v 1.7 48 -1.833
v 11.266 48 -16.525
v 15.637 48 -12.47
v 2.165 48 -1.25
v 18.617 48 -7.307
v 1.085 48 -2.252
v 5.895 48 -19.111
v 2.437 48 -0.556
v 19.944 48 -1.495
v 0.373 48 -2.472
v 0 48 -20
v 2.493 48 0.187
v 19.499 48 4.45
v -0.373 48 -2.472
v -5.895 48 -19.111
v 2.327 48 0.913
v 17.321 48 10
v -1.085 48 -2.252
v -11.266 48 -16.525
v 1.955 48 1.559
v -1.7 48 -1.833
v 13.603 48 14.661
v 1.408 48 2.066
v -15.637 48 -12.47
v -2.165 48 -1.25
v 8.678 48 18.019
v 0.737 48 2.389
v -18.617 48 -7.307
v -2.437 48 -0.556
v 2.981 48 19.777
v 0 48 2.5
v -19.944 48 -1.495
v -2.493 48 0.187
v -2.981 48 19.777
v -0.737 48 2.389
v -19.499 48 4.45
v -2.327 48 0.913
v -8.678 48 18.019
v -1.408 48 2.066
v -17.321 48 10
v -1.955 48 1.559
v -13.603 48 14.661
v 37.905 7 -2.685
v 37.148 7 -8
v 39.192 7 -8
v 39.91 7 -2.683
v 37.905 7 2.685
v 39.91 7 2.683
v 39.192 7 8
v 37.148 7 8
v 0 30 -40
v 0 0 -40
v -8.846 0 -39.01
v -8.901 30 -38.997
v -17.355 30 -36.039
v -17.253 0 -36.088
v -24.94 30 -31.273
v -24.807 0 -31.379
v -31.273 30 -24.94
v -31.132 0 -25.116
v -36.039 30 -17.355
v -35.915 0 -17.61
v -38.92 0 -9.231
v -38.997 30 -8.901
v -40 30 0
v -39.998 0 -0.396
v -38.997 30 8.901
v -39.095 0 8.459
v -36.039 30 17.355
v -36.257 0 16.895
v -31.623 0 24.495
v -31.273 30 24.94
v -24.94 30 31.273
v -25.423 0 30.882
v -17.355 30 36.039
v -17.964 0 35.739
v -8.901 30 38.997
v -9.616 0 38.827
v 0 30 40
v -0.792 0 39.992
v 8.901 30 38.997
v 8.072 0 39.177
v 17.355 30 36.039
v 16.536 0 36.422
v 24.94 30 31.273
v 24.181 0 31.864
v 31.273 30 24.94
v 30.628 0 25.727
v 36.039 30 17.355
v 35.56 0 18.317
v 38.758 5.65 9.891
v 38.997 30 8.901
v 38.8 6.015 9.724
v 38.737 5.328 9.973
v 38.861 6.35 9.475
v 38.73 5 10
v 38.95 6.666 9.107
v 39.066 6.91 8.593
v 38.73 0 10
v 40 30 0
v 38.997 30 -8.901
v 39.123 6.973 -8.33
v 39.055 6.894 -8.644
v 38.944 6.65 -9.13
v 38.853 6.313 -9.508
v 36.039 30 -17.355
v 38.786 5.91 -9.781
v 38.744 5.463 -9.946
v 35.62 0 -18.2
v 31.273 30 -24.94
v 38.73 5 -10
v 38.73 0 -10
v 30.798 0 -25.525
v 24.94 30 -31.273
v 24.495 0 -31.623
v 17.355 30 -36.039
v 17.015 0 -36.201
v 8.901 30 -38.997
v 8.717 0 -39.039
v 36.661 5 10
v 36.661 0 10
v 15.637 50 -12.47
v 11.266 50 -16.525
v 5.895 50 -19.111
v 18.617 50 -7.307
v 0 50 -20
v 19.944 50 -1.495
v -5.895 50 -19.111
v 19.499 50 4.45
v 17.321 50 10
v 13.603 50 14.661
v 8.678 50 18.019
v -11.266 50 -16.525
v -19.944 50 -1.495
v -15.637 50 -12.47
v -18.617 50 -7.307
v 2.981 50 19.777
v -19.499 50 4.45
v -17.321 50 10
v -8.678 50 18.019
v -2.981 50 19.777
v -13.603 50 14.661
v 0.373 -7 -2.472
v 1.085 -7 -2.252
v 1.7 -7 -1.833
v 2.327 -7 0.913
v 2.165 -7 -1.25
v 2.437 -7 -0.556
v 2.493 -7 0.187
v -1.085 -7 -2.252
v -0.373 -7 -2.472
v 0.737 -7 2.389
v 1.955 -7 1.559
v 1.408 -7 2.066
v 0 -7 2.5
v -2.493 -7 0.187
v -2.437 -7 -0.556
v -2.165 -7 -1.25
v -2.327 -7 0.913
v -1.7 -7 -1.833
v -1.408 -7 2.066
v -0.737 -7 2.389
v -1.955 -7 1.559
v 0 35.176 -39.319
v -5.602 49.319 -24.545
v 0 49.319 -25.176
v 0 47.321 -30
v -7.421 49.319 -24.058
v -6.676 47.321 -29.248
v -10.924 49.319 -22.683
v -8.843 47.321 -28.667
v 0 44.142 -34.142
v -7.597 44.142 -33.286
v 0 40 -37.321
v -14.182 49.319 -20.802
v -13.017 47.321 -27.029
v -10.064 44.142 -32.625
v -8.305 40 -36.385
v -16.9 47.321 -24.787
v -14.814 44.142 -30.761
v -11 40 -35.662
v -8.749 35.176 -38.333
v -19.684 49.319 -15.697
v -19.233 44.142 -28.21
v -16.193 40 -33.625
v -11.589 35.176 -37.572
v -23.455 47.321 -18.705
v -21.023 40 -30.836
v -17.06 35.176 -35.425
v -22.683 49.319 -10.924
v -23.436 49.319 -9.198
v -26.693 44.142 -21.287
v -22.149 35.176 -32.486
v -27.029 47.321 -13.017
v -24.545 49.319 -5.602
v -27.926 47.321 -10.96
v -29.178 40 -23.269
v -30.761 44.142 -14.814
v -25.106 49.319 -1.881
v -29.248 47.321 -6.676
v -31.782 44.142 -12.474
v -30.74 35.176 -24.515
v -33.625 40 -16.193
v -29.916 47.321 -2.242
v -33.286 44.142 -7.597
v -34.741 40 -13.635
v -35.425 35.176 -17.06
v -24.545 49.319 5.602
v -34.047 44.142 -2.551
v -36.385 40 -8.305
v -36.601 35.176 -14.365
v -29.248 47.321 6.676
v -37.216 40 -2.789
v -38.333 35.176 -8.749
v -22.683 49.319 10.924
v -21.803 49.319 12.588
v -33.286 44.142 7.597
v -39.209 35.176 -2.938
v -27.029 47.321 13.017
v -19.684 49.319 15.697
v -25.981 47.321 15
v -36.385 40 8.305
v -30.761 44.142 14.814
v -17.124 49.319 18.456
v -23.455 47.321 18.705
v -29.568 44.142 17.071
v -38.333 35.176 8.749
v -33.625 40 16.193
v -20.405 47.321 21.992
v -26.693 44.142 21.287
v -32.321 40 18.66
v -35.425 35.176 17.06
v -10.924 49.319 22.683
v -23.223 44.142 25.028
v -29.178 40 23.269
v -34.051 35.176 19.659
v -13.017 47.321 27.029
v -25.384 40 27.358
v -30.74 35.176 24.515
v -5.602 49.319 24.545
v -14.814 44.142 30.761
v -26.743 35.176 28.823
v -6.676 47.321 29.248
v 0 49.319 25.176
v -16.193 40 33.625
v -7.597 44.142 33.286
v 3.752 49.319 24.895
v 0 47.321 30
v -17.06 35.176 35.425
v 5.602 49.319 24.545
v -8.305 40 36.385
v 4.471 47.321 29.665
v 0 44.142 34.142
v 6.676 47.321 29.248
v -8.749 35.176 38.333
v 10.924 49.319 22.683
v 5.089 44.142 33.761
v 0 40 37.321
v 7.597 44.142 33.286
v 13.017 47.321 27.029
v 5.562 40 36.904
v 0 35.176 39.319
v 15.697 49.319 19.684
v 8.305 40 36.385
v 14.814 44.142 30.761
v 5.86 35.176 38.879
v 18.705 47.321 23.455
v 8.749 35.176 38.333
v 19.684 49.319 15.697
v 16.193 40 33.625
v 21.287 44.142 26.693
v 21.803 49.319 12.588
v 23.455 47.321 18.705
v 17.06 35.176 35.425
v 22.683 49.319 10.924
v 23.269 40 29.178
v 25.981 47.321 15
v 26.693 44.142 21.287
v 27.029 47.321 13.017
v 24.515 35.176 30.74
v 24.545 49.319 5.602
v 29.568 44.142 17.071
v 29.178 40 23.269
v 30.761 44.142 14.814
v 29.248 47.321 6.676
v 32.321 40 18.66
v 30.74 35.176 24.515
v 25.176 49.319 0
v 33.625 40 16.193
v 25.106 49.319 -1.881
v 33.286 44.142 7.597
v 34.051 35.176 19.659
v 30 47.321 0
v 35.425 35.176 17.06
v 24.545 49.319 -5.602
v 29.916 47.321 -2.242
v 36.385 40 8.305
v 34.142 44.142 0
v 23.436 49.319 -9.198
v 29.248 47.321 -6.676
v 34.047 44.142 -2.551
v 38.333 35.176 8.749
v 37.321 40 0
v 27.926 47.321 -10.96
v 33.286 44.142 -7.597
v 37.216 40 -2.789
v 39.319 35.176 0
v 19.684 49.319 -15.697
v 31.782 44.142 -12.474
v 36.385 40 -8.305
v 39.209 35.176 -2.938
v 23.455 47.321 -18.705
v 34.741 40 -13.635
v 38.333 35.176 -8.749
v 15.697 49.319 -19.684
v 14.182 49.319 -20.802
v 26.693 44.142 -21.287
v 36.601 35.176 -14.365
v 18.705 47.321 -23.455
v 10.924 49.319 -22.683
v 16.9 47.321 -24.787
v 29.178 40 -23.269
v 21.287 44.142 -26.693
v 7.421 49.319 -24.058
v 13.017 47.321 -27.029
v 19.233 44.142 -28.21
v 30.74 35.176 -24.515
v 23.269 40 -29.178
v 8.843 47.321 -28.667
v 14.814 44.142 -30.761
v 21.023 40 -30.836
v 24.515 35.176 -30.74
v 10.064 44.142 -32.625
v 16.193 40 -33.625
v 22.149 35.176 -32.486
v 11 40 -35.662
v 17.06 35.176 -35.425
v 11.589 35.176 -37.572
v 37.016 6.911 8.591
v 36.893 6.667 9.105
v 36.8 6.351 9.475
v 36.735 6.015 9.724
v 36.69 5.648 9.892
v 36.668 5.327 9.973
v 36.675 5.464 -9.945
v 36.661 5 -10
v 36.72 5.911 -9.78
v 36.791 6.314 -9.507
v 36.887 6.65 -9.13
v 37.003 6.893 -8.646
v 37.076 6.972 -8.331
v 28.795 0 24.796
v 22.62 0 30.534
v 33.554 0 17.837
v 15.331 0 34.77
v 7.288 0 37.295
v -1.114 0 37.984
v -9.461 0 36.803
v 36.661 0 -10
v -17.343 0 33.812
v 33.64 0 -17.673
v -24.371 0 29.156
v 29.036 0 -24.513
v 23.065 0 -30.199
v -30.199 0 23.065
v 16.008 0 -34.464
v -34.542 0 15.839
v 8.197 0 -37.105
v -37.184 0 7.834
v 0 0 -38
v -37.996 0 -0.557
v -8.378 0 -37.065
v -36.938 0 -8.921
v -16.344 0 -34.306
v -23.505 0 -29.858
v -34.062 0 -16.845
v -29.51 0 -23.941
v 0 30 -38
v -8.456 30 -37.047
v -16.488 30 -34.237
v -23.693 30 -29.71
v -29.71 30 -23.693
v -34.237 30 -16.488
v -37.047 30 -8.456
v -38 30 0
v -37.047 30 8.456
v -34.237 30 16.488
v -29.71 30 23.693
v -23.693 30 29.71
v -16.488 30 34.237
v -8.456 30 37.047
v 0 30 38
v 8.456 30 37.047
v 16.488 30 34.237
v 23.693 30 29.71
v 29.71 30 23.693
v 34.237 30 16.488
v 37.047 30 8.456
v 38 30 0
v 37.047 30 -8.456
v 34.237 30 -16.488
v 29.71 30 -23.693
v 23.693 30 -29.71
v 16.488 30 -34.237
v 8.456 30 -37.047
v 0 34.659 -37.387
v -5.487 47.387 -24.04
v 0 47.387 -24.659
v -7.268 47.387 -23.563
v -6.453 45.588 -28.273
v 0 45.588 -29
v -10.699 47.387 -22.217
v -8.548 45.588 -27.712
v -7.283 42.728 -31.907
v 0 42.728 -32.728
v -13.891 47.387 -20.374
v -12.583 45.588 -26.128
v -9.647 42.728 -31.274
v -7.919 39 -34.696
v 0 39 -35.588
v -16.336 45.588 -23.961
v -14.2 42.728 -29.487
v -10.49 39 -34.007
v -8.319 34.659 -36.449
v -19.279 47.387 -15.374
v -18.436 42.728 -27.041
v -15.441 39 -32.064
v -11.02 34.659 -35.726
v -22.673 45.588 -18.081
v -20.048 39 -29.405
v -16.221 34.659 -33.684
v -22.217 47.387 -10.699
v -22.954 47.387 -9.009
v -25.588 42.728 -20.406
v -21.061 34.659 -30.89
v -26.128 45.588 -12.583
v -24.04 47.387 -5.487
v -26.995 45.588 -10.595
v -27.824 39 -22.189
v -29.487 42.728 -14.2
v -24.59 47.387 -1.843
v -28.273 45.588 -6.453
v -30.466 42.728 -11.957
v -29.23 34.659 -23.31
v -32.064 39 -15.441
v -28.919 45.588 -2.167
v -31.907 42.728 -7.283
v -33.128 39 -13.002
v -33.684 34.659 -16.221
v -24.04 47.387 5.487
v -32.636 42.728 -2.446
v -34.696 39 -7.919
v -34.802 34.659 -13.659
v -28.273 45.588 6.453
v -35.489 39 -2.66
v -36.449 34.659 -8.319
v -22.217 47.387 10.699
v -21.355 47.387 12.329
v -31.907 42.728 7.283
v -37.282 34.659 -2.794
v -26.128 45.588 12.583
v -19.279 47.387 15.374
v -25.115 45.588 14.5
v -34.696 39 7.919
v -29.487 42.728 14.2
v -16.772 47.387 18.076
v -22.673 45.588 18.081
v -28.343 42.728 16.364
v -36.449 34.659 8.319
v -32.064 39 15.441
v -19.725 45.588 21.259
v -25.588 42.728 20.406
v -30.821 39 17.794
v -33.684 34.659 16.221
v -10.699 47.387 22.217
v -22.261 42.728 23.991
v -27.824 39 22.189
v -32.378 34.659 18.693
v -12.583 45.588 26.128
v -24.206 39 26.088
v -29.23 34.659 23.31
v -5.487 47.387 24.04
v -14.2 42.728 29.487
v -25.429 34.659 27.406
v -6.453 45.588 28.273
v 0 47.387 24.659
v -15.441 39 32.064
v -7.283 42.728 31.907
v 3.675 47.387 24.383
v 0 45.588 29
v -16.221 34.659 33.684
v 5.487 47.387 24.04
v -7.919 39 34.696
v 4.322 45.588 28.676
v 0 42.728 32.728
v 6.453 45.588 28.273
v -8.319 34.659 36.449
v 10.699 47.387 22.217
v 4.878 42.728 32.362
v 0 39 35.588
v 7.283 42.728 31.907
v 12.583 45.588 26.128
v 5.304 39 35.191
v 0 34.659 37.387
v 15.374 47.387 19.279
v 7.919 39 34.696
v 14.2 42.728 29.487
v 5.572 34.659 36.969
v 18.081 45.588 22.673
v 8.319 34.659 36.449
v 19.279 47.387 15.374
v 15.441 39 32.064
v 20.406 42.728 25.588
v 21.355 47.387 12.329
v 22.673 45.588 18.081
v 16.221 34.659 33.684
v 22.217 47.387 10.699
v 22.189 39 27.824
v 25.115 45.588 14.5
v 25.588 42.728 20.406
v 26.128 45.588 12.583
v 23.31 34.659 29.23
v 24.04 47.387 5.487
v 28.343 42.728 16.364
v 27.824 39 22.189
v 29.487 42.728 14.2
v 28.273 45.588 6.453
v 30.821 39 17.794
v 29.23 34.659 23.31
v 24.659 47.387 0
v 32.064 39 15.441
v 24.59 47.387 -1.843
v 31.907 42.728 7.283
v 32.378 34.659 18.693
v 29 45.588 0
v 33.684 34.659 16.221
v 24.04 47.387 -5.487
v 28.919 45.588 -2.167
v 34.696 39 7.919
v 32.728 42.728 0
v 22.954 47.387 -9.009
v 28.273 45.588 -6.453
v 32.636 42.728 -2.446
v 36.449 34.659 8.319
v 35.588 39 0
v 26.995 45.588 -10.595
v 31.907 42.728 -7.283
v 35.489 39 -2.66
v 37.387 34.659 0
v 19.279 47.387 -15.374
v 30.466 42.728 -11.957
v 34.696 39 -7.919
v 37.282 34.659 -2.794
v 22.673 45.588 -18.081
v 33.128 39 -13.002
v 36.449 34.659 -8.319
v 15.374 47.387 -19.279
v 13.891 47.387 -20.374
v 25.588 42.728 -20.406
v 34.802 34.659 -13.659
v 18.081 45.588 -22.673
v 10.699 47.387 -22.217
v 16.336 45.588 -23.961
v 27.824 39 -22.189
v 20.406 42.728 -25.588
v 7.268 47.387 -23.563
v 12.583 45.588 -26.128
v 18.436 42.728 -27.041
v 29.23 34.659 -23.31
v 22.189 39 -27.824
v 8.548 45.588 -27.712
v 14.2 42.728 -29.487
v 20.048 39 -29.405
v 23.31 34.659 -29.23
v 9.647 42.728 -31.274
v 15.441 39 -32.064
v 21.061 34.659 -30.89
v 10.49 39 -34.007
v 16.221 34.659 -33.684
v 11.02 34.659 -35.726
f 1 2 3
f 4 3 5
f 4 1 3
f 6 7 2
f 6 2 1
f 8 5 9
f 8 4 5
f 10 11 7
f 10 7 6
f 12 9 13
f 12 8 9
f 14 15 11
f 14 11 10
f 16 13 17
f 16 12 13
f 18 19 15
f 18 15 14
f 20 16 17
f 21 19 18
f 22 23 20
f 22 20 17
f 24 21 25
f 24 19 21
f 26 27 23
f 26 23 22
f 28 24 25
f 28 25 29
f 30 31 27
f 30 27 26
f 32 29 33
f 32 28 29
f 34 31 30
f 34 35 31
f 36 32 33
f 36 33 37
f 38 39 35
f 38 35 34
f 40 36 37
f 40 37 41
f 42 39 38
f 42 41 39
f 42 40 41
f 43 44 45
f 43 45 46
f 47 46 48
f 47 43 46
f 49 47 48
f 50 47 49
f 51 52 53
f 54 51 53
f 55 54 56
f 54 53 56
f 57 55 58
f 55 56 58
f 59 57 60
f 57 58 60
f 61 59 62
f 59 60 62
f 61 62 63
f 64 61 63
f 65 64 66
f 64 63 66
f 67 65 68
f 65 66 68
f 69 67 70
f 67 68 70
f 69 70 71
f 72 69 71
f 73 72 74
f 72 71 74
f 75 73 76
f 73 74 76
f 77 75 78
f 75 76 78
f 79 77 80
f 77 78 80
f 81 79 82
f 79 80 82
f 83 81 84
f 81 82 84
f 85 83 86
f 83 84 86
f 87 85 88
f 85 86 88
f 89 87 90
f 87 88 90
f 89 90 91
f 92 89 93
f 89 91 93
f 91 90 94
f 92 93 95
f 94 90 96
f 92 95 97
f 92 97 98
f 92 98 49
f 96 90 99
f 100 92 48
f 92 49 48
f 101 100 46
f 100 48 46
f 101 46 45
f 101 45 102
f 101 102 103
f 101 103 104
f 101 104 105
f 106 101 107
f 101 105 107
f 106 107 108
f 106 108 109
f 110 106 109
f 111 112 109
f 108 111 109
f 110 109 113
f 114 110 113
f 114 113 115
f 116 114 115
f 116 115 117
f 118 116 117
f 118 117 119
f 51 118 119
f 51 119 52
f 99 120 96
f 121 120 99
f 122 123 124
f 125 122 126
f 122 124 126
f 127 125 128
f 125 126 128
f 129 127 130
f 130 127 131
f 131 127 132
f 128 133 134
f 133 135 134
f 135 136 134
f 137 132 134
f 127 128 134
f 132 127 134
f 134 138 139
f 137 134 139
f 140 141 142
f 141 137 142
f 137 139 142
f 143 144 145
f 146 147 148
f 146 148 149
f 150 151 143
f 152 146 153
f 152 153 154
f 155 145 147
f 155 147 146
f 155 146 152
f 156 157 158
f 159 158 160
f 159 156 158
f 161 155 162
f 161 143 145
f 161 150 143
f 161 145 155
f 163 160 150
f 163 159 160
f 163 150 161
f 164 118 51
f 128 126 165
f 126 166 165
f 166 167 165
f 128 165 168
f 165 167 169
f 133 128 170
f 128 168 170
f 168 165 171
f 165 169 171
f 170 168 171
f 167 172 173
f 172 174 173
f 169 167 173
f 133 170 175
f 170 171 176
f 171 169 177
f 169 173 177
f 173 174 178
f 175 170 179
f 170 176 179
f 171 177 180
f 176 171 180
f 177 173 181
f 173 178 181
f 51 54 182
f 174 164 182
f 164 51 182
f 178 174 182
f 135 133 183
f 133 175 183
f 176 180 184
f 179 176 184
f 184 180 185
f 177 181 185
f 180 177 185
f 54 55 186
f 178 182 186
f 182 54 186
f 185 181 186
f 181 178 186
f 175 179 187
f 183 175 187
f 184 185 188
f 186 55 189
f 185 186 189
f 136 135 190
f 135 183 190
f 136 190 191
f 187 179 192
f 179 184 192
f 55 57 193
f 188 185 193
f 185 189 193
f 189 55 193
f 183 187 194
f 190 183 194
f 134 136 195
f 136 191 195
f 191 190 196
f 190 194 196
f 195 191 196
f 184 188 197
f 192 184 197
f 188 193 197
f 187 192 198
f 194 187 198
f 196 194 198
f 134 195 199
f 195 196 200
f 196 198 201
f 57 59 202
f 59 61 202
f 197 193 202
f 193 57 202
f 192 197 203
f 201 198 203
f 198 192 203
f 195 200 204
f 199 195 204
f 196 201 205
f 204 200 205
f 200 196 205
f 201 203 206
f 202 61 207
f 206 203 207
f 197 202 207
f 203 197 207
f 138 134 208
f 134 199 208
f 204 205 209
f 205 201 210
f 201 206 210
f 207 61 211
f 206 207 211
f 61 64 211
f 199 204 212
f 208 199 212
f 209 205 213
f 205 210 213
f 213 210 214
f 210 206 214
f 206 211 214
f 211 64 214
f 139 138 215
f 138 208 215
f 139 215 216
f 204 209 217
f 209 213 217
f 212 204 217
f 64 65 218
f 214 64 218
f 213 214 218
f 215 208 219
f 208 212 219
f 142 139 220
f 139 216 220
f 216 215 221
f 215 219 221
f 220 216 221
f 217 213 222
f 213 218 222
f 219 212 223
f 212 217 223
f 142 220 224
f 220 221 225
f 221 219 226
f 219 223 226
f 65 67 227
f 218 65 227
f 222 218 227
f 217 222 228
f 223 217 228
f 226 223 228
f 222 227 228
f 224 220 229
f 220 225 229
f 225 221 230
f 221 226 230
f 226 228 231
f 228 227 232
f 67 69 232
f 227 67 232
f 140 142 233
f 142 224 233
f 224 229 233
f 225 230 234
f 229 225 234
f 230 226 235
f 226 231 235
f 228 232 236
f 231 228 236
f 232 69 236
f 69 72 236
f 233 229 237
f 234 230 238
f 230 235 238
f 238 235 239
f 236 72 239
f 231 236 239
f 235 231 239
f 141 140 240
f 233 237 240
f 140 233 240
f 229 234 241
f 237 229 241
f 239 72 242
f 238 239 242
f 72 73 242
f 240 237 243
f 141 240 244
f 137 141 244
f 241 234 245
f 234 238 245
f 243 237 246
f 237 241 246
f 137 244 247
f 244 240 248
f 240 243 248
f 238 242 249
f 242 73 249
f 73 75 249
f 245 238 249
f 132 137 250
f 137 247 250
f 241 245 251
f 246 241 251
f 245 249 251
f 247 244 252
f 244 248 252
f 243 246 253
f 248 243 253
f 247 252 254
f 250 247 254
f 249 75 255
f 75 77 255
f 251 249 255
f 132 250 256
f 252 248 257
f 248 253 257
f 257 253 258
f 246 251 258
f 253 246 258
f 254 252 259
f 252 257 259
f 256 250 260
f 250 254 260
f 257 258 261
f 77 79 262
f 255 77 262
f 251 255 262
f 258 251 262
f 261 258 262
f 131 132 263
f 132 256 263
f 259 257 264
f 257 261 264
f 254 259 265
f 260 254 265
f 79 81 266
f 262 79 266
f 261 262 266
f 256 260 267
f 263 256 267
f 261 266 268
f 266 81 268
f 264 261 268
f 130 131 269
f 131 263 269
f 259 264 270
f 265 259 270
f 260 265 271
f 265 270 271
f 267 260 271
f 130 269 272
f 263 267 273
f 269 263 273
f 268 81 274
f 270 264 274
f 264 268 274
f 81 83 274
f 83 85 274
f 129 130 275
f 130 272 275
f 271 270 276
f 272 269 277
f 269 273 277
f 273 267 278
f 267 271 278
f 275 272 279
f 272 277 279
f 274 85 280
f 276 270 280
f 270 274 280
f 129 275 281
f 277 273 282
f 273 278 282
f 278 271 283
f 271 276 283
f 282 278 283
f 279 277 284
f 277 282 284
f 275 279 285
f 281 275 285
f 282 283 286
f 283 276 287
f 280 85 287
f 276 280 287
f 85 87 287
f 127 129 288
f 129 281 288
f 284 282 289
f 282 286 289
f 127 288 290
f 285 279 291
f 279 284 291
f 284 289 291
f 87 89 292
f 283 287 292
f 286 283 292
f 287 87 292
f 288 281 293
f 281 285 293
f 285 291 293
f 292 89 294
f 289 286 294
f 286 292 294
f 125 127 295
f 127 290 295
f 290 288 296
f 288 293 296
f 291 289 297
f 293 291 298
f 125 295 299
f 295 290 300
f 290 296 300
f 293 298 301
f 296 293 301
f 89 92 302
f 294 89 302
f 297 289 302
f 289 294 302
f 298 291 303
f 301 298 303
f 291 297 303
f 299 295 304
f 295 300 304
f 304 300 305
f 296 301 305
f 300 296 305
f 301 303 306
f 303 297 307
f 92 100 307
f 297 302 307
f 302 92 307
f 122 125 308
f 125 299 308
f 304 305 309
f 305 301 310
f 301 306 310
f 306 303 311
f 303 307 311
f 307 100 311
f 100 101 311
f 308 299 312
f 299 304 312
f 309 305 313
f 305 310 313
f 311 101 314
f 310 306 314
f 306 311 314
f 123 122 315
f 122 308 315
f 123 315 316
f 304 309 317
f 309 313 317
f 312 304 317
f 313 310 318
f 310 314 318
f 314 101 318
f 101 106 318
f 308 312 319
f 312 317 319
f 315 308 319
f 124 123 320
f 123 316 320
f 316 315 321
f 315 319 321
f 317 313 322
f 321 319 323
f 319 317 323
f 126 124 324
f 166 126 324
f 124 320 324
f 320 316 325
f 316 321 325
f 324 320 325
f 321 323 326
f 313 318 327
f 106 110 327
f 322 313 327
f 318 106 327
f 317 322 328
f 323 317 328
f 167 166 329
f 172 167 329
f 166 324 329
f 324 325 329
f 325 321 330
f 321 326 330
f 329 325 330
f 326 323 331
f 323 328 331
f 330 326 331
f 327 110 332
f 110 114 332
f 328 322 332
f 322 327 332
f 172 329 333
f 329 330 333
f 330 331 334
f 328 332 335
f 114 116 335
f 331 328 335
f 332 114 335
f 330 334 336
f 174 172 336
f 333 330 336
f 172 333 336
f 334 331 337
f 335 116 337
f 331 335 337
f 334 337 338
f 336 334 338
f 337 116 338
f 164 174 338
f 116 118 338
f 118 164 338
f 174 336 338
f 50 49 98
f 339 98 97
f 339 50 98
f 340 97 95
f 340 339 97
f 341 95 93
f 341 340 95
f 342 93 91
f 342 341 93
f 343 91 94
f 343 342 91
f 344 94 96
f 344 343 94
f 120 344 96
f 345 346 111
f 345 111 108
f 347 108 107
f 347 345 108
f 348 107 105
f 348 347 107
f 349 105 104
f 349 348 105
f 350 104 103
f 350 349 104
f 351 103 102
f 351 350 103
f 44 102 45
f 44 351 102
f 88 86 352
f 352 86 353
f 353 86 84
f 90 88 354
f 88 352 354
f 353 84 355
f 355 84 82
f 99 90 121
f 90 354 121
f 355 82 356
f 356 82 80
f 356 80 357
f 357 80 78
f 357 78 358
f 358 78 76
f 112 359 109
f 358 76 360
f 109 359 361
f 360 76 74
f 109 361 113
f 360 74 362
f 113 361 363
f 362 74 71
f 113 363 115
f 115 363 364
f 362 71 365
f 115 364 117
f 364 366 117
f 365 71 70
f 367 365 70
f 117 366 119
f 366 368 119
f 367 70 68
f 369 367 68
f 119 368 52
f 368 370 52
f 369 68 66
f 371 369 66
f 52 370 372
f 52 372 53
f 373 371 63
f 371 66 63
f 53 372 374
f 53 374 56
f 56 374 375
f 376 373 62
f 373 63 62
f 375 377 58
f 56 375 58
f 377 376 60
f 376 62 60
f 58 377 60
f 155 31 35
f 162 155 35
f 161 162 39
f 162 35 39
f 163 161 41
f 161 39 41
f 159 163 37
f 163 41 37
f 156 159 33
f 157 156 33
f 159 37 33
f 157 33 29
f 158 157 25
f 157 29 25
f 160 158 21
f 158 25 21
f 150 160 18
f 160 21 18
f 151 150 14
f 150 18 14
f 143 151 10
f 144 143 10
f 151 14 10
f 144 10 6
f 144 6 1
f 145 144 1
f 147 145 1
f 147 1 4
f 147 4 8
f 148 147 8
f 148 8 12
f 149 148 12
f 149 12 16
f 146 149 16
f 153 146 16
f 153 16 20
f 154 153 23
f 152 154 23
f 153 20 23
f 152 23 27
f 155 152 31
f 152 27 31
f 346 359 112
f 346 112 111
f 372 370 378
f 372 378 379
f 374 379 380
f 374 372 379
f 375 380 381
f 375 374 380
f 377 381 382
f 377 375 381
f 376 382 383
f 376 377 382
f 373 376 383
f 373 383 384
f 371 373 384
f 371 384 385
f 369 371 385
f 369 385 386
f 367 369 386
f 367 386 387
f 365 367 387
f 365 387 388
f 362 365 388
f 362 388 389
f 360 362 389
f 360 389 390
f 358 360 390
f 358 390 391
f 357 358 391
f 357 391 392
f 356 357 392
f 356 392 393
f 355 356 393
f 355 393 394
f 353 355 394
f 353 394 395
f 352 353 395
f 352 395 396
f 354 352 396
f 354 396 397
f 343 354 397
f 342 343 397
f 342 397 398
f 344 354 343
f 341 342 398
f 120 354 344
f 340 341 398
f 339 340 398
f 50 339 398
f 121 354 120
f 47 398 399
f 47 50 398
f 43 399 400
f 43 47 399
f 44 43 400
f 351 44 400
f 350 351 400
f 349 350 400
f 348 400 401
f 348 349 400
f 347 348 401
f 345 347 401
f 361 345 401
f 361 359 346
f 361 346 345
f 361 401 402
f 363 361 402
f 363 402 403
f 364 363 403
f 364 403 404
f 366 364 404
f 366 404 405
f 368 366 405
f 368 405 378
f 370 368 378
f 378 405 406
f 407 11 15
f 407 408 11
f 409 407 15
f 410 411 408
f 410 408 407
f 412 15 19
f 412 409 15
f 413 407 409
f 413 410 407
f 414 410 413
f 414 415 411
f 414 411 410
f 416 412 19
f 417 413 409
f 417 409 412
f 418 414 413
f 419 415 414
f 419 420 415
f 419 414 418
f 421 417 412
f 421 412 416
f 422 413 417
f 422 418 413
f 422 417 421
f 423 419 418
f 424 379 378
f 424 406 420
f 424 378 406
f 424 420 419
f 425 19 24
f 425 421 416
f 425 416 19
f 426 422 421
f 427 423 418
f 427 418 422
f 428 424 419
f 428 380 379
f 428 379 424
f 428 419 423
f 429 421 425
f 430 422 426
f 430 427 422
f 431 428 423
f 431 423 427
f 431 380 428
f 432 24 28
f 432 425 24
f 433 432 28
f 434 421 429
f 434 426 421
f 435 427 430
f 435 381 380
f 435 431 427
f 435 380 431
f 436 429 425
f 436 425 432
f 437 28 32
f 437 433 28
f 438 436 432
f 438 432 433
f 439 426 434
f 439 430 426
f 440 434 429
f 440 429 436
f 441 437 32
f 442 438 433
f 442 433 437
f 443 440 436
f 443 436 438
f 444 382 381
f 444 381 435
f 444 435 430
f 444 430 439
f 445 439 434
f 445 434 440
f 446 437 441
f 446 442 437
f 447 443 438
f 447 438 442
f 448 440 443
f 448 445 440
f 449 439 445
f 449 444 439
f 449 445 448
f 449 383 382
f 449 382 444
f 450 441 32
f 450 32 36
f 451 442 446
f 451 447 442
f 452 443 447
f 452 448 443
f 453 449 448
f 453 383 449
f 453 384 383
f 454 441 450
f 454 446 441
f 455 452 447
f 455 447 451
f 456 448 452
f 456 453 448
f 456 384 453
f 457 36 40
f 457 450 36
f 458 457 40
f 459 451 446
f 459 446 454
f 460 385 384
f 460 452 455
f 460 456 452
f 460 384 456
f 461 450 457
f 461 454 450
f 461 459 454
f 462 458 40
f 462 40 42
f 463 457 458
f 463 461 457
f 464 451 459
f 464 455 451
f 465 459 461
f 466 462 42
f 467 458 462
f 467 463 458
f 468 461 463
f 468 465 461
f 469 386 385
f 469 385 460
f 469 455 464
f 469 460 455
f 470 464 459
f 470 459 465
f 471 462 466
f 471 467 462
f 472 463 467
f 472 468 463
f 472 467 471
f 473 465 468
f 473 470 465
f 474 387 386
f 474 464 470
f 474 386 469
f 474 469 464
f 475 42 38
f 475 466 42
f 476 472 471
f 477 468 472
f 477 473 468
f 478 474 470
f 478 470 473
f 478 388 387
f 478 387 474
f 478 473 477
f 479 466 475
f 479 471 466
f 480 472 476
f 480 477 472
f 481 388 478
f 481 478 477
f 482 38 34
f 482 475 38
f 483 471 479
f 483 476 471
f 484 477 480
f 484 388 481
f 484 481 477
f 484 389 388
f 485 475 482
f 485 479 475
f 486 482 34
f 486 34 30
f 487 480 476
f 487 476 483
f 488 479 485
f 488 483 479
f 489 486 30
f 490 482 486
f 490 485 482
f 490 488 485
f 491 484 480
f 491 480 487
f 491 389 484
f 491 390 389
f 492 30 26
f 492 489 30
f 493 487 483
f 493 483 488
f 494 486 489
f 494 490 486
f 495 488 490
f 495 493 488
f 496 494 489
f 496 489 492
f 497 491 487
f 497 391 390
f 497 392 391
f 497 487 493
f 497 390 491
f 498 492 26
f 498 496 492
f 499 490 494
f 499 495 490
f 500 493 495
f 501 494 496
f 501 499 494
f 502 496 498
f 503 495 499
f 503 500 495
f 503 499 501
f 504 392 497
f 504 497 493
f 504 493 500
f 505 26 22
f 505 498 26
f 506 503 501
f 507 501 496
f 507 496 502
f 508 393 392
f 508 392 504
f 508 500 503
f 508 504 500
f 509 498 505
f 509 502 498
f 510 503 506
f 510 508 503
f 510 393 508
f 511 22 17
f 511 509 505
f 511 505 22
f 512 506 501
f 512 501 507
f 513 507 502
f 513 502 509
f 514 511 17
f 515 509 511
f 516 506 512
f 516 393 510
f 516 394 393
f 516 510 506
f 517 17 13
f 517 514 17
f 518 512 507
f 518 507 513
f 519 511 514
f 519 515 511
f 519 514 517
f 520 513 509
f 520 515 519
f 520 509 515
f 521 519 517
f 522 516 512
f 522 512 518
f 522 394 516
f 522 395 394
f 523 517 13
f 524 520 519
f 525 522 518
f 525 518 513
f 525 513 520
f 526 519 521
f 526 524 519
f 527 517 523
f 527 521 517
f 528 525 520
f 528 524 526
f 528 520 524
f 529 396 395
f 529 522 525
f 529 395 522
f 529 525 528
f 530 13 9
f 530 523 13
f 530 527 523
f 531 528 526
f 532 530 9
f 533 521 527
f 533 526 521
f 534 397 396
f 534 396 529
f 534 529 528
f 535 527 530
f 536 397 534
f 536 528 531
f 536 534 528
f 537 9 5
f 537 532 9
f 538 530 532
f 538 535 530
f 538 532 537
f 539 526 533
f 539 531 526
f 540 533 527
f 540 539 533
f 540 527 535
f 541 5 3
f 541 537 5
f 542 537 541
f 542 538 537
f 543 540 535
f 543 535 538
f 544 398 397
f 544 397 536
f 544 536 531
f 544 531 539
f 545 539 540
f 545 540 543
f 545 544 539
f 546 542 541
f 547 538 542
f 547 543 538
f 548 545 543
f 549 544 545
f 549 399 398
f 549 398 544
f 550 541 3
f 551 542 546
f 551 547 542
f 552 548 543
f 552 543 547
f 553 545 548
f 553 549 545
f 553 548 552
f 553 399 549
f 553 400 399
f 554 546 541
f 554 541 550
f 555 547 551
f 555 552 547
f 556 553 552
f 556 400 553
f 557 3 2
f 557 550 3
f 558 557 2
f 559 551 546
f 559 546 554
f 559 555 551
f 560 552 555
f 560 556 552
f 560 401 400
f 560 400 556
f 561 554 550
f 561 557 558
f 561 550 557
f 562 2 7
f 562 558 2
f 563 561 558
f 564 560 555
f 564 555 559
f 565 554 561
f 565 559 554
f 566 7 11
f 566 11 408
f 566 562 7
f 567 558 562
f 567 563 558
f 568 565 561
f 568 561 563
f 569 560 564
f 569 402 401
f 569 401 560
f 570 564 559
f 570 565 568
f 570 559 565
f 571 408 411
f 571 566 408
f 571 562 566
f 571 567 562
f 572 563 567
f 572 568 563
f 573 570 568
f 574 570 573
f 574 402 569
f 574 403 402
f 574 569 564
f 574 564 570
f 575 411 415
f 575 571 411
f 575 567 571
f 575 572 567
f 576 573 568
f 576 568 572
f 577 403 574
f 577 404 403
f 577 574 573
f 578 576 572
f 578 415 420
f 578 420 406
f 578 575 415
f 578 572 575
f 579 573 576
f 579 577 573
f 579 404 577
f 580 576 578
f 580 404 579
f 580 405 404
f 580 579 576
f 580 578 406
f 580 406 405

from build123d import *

# Parameters (mm, degrees)
SHELL1_T            = -2
SKETCH2_R           = 2.5
BOSS_EXTRUDE1_DEPTH = 55
CUT_EXTRUDE2_DEPTH  = 50


with BuildPart() as part:
    # Sketch1 → Revolve1 (revolve)
    with BuildSketch(Plane(origin=(0, 0, 0), x_dir=(0, 0, -1), z_dir=(1, 0, 0))):
        with BuildLine():
            Line((0, 0), (0, 50))
            Line((0, 50), (20, 50))
            ThreePointArc((20, 50), (34.142135624, 44.142135624), (40, 30))
            Line((40, 30), (40, 0))
            Line((40, 0), (0, 0))
        make_face()
    revolve(axis=Axis((0, 0, 0), (0, 1, 0)))

    # Shell1
    shell1_openings = [part.faces().sort_by_distance(p)[0] for p in [
        (0, 0, 0),
    ]]
    offset(amount=SHELL1_T, openings=shell1_openings, kind=Kind.INTERSECTION)

    # Sketch2 → Boss-Extrude1 (add)
    with BuildSketch(Plane.XZ.offset(-48)):
        with Locations(Location((0, 0, 0), (0, 0, 90))):
            Circle(SKETCH2_R)
    extrude(amount=BOSS_EXTRUDE1_DEPTH)

    # Sketch3 → Cut-Extrude2 (cut)
    with BuildSketch(Plane(origin=(6, 0, 0), x_dir=(0, 0, -1), z_dir=(1, 0, 0))):
        with BuildLine():
            Line((-10, 0), (10, 0))
            Line((10, 0), (10, 5))
            ThreePointArc((10, 5), (9.414213562, 6.414213562), (8, 7))
            Line((8, 7), (-8, 7))
            ThreePointArc((-8, 7), (-9.414213562, 6.414213562), (-10, 5))
            Line((-10, 5), (-10, 0))
        make_face()
    extrude(amount=CUT_EXTRUDE2_DEPTH, mode=Mode.SUBTRACT)


solid = part.part
